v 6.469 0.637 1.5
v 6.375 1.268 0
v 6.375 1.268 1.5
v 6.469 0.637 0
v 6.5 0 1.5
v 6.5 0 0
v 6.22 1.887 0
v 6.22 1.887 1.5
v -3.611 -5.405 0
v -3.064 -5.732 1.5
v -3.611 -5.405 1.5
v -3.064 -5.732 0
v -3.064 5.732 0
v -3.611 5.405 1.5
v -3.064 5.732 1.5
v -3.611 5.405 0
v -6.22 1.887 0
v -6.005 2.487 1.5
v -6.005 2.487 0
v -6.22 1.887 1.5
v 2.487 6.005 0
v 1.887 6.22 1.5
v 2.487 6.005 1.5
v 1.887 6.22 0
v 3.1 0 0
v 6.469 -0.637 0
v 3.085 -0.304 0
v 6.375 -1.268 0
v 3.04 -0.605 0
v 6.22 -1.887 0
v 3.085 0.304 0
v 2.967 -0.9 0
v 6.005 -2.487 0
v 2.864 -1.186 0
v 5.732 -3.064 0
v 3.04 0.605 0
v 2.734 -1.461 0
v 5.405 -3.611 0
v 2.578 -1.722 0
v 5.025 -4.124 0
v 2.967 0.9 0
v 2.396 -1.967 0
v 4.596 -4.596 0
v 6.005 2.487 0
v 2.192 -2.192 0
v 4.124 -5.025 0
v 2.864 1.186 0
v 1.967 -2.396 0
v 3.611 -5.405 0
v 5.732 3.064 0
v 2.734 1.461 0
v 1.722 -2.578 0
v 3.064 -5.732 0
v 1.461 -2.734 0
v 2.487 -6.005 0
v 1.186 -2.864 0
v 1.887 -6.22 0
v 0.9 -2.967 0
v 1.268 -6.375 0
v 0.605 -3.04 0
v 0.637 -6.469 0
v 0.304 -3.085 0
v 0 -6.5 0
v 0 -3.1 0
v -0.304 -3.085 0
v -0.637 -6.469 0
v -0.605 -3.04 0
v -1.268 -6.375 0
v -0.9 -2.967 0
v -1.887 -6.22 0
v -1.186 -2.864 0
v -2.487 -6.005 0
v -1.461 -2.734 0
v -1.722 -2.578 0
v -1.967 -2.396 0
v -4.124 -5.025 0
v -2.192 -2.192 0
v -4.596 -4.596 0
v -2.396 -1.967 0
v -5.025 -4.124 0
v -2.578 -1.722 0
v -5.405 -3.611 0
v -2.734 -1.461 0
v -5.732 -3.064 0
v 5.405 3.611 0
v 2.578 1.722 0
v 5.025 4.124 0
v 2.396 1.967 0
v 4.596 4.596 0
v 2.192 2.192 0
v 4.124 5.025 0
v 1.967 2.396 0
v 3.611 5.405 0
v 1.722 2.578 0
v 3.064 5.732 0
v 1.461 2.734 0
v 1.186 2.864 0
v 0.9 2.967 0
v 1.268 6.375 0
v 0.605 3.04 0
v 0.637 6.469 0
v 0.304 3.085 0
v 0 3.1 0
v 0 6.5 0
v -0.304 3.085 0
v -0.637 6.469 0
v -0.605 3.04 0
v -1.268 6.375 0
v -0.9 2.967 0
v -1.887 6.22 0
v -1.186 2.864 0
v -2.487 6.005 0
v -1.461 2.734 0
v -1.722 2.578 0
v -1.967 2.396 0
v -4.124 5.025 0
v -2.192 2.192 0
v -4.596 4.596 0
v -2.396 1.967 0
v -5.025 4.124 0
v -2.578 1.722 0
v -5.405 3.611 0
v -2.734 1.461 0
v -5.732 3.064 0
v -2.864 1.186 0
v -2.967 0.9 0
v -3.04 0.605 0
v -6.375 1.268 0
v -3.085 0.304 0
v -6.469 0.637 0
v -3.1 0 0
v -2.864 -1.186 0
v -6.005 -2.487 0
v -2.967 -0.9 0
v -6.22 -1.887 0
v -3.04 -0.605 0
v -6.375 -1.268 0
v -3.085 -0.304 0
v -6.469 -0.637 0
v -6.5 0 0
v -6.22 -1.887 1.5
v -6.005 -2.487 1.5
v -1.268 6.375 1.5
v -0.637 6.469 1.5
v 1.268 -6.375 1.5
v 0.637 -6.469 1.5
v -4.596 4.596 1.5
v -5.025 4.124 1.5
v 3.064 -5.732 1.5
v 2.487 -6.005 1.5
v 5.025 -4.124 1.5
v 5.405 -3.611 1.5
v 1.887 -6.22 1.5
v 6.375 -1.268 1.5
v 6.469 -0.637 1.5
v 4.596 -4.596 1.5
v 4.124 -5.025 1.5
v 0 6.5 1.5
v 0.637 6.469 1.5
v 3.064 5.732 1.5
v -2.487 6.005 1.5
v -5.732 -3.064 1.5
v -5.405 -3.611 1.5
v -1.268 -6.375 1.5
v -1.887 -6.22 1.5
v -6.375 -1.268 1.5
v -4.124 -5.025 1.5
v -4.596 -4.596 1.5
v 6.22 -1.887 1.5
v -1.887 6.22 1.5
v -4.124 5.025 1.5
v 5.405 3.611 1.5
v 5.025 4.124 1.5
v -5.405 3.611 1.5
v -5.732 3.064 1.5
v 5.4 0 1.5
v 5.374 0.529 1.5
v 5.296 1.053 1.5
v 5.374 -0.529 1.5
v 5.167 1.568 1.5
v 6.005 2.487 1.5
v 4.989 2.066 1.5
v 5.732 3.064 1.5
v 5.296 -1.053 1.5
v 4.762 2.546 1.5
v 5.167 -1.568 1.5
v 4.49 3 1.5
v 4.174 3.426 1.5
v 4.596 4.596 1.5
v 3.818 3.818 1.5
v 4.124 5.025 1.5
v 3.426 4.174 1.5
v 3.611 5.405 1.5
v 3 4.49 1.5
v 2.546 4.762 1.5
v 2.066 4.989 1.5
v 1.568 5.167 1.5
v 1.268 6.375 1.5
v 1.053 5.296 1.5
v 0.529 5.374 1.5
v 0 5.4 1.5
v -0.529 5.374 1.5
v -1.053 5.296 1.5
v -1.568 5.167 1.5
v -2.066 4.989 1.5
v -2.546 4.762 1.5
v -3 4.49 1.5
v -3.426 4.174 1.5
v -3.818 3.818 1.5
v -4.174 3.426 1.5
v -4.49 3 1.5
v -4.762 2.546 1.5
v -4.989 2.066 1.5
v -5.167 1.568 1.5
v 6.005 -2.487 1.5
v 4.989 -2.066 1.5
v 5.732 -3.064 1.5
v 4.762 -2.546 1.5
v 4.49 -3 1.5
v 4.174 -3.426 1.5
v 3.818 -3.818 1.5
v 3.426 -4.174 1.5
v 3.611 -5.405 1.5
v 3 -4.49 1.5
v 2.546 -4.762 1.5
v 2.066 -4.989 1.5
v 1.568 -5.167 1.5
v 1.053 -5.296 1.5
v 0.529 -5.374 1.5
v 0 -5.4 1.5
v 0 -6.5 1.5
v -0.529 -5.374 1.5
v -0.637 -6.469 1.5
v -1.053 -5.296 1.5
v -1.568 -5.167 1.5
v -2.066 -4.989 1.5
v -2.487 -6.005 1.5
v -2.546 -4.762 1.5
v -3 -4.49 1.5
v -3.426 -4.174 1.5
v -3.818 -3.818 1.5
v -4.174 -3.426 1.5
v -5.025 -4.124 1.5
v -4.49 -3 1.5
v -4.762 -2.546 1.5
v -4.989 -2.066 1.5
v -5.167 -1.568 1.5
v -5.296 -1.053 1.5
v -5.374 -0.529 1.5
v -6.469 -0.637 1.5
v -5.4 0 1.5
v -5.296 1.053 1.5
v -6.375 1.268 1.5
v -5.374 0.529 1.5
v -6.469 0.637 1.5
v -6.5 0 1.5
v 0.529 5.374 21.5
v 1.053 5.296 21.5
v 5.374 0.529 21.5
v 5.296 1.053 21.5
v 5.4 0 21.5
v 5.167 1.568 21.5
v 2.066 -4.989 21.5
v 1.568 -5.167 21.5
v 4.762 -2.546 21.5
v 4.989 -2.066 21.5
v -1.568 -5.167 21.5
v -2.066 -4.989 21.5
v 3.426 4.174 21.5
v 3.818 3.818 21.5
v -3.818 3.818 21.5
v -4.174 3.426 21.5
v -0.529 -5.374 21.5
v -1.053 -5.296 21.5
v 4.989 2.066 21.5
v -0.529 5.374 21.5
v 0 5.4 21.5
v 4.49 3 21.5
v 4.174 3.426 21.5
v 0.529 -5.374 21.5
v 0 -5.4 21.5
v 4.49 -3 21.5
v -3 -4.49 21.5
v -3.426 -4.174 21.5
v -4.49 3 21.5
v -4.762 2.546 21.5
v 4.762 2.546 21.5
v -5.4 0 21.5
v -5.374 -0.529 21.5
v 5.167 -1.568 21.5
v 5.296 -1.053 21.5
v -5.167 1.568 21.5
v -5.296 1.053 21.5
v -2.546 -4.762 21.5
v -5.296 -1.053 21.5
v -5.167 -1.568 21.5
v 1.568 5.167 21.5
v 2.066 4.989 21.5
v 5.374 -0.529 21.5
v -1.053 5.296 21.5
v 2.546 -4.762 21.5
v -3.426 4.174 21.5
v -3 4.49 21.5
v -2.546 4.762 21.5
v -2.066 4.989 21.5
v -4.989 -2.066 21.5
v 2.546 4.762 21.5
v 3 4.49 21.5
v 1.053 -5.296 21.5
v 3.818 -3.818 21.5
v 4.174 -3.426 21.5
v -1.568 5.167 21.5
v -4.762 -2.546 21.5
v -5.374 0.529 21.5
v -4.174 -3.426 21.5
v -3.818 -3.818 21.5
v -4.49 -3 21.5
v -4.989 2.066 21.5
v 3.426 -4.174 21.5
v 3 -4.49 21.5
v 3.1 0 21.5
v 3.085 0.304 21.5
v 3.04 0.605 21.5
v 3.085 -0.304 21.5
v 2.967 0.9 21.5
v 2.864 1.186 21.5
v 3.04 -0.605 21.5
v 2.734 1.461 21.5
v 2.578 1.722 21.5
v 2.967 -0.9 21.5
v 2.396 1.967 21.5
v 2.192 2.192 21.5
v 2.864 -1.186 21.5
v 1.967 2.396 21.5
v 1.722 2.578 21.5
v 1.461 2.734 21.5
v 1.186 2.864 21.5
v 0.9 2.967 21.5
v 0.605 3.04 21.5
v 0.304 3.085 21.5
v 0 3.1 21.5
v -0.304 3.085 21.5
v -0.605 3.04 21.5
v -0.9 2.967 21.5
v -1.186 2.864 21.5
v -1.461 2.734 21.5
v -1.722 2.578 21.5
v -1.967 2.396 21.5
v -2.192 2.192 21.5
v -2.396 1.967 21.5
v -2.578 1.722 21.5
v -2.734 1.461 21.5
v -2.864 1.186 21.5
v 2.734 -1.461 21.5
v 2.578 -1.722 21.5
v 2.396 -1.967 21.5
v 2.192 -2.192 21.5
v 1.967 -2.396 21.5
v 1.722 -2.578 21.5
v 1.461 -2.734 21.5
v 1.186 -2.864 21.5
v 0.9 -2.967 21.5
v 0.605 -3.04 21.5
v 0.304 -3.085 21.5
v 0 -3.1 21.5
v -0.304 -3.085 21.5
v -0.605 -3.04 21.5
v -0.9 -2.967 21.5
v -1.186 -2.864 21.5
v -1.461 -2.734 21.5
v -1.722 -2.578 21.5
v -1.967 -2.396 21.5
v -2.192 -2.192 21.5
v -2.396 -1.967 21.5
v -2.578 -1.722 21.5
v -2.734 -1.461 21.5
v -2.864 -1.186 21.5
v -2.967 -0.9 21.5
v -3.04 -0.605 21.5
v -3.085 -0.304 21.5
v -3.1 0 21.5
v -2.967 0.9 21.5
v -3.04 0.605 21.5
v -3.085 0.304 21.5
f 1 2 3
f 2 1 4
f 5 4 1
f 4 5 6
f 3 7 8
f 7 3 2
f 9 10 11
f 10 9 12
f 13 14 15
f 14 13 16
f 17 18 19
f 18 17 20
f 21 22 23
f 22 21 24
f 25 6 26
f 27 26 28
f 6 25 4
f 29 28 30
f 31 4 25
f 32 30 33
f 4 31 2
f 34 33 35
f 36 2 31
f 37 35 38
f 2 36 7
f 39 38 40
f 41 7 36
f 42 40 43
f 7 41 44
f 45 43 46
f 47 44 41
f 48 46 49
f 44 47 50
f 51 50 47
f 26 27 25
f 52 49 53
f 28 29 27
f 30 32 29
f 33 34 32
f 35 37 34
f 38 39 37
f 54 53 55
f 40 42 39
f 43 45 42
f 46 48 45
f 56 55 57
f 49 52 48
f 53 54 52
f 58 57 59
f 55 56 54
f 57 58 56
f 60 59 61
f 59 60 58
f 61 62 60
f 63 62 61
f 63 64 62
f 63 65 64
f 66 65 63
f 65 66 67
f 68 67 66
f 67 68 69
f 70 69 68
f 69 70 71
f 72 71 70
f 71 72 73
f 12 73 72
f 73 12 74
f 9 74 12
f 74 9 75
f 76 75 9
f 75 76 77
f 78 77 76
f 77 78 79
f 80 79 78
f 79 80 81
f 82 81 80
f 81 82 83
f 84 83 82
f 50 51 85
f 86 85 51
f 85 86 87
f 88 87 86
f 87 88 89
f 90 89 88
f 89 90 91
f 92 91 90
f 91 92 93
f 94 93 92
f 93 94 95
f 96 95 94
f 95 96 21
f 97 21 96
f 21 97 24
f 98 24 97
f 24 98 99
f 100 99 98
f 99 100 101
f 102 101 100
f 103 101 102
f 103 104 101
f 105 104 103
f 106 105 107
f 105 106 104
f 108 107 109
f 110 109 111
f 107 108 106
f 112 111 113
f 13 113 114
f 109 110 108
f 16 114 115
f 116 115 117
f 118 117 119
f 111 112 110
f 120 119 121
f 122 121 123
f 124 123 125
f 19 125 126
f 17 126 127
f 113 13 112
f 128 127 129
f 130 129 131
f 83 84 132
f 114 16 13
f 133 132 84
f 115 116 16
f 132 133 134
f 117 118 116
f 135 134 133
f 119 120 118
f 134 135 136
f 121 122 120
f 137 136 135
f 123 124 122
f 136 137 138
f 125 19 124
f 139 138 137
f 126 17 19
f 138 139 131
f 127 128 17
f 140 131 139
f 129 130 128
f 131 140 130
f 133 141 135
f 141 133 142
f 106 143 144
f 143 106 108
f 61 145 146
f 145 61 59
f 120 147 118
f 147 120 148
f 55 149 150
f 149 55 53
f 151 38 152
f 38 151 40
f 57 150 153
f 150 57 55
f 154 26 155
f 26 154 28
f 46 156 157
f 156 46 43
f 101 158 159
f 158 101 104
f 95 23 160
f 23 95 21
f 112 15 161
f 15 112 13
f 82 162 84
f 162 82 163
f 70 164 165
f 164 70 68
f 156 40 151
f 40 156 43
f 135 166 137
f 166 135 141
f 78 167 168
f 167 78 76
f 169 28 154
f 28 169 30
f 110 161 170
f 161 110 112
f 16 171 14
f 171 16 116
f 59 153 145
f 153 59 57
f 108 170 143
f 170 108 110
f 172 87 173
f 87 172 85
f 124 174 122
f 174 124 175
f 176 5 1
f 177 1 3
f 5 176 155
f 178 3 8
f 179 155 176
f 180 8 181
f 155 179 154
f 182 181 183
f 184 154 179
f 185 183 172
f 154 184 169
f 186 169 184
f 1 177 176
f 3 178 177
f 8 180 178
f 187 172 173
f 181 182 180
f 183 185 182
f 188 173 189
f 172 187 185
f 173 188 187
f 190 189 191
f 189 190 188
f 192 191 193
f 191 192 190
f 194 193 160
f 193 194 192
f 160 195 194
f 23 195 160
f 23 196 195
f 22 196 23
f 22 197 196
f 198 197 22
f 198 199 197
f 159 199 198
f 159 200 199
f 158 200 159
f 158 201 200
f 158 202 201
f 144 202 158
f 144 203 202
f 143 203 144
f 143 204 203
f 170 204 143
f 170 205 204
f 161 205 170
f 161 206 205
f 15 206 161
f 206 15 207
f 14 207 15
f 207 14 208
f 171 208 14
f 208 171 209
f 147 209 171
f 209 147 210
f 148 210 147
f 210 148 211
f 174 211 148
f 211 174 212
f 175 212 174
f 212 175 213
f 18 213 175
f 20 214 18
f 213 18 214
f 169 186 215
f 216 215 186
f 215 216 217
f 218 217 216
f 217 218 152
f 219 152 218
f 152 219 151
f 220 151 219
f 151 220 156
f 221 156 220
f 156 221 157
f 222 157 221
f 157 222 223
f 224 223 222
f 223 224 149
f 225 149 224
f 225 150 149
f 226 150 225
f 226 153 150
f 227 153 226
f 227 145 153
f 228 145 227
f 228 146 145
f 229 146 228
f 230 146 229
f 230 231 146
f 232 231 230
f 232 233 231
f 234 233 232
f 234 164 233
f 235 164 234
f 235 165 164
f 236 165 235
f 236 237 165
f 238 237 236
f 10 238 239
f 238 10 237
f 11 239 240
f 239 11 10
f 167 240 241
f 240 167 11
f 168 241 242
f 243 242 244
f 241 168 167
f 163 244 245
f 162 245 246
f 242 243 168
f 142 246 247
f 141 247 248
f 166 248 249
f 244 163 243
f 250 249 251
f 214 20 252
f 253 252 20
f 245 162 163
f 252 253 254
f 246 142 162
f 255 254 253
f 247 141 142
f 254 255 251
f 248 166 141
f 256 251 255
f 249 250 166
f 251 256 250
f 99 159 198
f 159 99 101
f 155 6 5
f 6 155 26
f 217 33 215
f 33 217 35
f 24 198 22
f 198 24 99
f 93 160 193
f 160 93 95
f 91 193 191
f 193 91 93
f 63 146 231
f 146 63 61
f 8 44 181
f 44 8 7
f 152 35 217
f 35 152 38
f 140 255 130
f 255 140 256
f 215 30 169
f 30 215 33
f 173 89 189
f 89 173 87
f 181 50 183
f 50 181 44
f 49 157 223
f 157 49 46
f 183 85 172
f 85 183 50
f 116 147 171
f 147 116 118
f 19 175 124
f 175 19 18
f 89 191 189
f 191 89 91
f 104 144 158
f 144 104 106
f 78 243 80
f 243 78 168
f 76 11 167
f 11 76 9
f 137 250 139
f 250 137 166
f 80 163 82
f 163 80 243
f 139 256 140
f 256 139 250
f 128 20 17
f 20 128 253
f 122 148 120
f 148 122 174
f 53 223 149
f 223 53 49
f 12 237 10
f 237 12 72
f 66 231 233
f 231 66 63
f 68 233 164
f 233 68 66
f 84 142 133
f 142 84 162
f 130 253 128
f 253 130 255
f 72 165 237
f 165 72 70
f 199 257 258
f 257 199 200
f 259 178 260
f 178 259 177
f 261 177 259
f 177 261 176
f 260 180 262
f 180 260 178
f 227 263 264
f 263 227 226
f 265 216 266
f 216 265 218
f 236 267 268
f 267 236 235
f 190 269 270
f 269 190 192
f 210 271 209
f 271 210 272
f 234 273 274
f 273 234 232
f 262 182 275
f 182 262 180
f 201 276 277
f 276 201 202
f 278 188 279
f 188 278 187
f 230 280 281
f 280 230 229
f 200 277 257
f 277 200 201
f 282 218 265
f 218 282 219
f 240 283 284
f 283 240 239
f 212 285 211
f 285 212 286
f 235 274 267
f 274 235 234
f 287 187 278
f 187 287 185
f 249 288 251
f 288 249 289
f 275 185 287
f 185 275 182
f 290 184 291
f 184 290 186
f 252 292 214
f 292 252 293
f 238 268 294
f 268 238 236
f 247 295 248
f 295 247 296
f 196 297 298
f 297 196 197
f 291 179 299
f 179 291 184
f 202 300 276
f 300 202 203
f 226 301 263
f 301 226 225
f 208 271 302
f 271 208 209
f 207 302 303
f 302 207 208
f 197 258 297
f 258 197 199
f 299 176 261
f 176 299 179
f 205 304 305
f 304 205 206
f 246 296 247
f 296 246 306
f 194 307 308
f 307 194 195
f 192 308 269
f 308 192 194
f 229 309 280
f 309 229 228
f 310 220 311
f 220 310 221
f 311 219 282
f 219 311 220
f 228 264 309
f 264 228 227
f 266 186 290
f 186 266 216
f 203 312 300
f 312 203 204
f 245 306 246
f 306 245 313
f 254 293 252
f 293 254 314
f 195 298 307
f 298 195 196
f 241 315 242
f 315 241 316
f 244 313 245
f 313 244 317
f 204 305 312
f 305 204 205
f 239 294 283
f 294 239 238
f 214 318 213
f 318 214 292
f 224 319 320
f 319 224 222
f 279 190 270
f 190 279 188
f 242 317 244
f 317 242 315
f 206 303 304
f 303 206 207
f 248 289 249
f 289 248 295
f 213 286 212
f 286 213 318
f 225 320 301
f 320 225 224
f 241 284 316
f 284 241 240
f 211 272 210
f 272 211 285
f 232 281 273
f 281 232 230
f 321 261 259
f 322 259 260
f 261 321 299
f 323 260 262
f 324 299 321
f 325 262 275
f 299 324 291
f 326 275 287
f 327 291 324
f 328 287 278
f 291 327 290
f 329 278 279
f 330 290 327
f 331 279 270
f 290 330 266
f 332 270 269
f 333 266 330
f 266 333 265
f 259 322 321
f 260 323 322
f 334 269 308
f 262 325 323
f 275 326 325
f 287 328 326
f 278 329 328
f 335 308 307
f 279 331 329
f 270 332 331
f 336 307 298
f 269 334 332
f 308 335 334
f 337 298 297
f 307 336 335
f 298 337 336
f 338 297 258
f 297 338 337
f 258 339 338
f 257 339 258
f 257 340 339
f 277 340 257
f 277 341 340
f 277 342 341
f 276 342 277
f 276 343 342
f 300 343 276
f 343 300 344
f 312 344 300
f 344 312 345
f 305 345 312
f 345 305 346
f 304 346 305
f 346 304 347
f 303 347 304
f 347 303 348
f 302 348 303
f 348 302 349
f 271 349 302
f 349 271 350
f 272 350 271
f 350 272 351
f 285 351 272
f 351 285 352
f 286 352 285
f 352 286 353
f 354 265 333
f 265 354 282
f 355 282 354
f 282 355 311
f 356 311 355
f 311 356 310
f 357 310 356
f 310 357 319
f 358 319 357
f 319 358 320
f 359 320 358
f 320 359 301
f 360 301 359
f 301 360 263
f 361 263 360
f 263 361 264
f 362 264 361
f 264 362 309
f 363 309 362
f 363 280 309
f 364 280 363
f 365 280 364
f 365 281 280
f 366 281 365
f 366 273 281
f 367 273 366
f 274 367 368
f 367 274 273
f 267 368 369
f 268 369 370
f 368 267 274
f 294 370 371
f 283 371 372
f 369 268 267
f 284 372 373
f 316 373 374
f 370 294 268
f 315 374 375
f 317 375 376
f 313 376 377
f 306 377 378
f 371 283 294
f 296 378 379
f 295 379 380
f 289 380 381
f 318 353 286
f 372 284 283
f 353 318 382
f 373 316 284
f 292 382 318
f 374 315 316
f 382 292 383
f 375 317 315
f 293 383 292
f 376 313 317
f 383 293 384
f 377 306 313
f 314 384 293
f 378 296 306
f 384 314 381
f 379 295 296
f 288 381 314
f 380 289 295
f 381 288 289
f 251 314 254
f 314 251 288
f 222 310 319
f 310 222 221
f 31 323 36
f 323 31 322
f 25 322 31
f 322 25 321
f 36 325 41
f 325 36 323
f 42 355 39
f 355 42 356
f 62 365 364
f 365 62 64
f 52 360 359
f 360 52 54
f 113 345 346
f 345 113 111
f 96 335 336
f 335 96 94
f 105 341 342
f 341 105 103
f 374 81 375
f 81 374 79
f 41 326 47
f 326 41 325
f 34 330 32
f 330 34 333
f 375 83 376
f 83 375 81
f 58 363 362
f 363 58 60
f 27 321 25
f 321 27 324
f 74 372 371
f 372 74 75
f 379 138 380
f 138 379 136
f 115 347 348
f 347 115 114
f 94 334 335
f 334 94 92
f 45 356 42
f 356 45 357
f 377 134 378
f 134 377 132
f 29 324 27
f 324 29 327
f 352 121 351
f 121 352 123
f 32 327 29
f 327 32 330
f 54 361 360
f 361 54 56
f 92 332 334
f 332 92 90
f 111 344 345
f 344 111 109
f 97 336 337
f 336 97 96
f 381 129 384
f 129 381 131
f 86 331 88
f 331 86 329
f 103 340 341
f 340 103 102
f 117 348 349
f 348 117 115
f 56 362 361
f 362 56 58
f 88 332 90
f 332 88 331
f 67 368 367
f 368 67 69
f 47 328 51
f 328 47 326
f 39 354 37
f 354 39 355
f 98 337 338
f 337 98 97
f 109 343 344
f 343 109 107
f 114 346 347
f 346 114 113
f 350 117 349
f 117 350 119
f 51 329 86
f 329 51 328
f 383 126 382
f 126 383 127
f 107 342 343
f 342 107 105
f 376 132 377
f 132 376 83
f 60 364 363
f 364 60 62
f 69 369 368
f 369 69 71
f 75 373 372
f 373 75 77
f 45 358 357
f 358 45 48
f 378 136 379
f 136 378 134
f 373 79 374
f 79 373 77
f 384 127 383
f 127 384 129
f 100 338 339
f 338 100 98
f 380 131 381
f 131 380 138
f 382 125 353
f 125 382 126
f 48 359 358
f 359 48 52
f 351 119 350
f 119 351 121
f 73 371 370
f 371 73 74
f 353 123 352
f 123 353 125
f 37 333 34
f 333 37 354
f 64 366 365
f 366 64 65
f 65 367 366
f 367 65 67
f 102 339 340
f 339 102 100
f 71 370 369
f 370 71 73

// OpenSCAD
// Parameters (mm)
collar_diameter = 13;          // Outer diameter of the bottom collar
collar_thickness = 1.5;         // Thickness of the collar (z = 0 → 1.5)
sleeve_outer_diameter = 10.8;  // Outer diameter of the sleeve body
sleeve_height = 20.0;           // Height of the sleeve body (above collar)
total_height = collar_thickness + sleeve_height; // Full part height = 21.5 mm
bore_diameter = 6.2;           // Diameter of the straight bore
cut_extra = 0.5;                // How much the cutting cylinder extends beyond each face

$fn = 64; // smooth circles

// Main solid (collar + sleeve) minus bore
difference() {
    // ---- Union of collar and sleeve body ----
    union() {
        // Collar (lies on the bed)
        cylinder(d = collar_diameter, h = collar_thickness, center = false);
        
        // Sleeve body (starts on top of collar)
        translate([0, 0, collar_thickness])
            cylinder(d = sleeve_outer_diameter, h = sleeve_height, center = false);
    }
    
    // ---- Bore (cutting shape) ----
    // Extends cut_extra beyond the bottom (z = -cut_extra) and top (z = total_height + cut_extra)
    translate([0, 0, -cut_extra])
        cylinder(d = bore_diameter,
                 h = total_height + 2*cut_extra,
                 center = false);
}
